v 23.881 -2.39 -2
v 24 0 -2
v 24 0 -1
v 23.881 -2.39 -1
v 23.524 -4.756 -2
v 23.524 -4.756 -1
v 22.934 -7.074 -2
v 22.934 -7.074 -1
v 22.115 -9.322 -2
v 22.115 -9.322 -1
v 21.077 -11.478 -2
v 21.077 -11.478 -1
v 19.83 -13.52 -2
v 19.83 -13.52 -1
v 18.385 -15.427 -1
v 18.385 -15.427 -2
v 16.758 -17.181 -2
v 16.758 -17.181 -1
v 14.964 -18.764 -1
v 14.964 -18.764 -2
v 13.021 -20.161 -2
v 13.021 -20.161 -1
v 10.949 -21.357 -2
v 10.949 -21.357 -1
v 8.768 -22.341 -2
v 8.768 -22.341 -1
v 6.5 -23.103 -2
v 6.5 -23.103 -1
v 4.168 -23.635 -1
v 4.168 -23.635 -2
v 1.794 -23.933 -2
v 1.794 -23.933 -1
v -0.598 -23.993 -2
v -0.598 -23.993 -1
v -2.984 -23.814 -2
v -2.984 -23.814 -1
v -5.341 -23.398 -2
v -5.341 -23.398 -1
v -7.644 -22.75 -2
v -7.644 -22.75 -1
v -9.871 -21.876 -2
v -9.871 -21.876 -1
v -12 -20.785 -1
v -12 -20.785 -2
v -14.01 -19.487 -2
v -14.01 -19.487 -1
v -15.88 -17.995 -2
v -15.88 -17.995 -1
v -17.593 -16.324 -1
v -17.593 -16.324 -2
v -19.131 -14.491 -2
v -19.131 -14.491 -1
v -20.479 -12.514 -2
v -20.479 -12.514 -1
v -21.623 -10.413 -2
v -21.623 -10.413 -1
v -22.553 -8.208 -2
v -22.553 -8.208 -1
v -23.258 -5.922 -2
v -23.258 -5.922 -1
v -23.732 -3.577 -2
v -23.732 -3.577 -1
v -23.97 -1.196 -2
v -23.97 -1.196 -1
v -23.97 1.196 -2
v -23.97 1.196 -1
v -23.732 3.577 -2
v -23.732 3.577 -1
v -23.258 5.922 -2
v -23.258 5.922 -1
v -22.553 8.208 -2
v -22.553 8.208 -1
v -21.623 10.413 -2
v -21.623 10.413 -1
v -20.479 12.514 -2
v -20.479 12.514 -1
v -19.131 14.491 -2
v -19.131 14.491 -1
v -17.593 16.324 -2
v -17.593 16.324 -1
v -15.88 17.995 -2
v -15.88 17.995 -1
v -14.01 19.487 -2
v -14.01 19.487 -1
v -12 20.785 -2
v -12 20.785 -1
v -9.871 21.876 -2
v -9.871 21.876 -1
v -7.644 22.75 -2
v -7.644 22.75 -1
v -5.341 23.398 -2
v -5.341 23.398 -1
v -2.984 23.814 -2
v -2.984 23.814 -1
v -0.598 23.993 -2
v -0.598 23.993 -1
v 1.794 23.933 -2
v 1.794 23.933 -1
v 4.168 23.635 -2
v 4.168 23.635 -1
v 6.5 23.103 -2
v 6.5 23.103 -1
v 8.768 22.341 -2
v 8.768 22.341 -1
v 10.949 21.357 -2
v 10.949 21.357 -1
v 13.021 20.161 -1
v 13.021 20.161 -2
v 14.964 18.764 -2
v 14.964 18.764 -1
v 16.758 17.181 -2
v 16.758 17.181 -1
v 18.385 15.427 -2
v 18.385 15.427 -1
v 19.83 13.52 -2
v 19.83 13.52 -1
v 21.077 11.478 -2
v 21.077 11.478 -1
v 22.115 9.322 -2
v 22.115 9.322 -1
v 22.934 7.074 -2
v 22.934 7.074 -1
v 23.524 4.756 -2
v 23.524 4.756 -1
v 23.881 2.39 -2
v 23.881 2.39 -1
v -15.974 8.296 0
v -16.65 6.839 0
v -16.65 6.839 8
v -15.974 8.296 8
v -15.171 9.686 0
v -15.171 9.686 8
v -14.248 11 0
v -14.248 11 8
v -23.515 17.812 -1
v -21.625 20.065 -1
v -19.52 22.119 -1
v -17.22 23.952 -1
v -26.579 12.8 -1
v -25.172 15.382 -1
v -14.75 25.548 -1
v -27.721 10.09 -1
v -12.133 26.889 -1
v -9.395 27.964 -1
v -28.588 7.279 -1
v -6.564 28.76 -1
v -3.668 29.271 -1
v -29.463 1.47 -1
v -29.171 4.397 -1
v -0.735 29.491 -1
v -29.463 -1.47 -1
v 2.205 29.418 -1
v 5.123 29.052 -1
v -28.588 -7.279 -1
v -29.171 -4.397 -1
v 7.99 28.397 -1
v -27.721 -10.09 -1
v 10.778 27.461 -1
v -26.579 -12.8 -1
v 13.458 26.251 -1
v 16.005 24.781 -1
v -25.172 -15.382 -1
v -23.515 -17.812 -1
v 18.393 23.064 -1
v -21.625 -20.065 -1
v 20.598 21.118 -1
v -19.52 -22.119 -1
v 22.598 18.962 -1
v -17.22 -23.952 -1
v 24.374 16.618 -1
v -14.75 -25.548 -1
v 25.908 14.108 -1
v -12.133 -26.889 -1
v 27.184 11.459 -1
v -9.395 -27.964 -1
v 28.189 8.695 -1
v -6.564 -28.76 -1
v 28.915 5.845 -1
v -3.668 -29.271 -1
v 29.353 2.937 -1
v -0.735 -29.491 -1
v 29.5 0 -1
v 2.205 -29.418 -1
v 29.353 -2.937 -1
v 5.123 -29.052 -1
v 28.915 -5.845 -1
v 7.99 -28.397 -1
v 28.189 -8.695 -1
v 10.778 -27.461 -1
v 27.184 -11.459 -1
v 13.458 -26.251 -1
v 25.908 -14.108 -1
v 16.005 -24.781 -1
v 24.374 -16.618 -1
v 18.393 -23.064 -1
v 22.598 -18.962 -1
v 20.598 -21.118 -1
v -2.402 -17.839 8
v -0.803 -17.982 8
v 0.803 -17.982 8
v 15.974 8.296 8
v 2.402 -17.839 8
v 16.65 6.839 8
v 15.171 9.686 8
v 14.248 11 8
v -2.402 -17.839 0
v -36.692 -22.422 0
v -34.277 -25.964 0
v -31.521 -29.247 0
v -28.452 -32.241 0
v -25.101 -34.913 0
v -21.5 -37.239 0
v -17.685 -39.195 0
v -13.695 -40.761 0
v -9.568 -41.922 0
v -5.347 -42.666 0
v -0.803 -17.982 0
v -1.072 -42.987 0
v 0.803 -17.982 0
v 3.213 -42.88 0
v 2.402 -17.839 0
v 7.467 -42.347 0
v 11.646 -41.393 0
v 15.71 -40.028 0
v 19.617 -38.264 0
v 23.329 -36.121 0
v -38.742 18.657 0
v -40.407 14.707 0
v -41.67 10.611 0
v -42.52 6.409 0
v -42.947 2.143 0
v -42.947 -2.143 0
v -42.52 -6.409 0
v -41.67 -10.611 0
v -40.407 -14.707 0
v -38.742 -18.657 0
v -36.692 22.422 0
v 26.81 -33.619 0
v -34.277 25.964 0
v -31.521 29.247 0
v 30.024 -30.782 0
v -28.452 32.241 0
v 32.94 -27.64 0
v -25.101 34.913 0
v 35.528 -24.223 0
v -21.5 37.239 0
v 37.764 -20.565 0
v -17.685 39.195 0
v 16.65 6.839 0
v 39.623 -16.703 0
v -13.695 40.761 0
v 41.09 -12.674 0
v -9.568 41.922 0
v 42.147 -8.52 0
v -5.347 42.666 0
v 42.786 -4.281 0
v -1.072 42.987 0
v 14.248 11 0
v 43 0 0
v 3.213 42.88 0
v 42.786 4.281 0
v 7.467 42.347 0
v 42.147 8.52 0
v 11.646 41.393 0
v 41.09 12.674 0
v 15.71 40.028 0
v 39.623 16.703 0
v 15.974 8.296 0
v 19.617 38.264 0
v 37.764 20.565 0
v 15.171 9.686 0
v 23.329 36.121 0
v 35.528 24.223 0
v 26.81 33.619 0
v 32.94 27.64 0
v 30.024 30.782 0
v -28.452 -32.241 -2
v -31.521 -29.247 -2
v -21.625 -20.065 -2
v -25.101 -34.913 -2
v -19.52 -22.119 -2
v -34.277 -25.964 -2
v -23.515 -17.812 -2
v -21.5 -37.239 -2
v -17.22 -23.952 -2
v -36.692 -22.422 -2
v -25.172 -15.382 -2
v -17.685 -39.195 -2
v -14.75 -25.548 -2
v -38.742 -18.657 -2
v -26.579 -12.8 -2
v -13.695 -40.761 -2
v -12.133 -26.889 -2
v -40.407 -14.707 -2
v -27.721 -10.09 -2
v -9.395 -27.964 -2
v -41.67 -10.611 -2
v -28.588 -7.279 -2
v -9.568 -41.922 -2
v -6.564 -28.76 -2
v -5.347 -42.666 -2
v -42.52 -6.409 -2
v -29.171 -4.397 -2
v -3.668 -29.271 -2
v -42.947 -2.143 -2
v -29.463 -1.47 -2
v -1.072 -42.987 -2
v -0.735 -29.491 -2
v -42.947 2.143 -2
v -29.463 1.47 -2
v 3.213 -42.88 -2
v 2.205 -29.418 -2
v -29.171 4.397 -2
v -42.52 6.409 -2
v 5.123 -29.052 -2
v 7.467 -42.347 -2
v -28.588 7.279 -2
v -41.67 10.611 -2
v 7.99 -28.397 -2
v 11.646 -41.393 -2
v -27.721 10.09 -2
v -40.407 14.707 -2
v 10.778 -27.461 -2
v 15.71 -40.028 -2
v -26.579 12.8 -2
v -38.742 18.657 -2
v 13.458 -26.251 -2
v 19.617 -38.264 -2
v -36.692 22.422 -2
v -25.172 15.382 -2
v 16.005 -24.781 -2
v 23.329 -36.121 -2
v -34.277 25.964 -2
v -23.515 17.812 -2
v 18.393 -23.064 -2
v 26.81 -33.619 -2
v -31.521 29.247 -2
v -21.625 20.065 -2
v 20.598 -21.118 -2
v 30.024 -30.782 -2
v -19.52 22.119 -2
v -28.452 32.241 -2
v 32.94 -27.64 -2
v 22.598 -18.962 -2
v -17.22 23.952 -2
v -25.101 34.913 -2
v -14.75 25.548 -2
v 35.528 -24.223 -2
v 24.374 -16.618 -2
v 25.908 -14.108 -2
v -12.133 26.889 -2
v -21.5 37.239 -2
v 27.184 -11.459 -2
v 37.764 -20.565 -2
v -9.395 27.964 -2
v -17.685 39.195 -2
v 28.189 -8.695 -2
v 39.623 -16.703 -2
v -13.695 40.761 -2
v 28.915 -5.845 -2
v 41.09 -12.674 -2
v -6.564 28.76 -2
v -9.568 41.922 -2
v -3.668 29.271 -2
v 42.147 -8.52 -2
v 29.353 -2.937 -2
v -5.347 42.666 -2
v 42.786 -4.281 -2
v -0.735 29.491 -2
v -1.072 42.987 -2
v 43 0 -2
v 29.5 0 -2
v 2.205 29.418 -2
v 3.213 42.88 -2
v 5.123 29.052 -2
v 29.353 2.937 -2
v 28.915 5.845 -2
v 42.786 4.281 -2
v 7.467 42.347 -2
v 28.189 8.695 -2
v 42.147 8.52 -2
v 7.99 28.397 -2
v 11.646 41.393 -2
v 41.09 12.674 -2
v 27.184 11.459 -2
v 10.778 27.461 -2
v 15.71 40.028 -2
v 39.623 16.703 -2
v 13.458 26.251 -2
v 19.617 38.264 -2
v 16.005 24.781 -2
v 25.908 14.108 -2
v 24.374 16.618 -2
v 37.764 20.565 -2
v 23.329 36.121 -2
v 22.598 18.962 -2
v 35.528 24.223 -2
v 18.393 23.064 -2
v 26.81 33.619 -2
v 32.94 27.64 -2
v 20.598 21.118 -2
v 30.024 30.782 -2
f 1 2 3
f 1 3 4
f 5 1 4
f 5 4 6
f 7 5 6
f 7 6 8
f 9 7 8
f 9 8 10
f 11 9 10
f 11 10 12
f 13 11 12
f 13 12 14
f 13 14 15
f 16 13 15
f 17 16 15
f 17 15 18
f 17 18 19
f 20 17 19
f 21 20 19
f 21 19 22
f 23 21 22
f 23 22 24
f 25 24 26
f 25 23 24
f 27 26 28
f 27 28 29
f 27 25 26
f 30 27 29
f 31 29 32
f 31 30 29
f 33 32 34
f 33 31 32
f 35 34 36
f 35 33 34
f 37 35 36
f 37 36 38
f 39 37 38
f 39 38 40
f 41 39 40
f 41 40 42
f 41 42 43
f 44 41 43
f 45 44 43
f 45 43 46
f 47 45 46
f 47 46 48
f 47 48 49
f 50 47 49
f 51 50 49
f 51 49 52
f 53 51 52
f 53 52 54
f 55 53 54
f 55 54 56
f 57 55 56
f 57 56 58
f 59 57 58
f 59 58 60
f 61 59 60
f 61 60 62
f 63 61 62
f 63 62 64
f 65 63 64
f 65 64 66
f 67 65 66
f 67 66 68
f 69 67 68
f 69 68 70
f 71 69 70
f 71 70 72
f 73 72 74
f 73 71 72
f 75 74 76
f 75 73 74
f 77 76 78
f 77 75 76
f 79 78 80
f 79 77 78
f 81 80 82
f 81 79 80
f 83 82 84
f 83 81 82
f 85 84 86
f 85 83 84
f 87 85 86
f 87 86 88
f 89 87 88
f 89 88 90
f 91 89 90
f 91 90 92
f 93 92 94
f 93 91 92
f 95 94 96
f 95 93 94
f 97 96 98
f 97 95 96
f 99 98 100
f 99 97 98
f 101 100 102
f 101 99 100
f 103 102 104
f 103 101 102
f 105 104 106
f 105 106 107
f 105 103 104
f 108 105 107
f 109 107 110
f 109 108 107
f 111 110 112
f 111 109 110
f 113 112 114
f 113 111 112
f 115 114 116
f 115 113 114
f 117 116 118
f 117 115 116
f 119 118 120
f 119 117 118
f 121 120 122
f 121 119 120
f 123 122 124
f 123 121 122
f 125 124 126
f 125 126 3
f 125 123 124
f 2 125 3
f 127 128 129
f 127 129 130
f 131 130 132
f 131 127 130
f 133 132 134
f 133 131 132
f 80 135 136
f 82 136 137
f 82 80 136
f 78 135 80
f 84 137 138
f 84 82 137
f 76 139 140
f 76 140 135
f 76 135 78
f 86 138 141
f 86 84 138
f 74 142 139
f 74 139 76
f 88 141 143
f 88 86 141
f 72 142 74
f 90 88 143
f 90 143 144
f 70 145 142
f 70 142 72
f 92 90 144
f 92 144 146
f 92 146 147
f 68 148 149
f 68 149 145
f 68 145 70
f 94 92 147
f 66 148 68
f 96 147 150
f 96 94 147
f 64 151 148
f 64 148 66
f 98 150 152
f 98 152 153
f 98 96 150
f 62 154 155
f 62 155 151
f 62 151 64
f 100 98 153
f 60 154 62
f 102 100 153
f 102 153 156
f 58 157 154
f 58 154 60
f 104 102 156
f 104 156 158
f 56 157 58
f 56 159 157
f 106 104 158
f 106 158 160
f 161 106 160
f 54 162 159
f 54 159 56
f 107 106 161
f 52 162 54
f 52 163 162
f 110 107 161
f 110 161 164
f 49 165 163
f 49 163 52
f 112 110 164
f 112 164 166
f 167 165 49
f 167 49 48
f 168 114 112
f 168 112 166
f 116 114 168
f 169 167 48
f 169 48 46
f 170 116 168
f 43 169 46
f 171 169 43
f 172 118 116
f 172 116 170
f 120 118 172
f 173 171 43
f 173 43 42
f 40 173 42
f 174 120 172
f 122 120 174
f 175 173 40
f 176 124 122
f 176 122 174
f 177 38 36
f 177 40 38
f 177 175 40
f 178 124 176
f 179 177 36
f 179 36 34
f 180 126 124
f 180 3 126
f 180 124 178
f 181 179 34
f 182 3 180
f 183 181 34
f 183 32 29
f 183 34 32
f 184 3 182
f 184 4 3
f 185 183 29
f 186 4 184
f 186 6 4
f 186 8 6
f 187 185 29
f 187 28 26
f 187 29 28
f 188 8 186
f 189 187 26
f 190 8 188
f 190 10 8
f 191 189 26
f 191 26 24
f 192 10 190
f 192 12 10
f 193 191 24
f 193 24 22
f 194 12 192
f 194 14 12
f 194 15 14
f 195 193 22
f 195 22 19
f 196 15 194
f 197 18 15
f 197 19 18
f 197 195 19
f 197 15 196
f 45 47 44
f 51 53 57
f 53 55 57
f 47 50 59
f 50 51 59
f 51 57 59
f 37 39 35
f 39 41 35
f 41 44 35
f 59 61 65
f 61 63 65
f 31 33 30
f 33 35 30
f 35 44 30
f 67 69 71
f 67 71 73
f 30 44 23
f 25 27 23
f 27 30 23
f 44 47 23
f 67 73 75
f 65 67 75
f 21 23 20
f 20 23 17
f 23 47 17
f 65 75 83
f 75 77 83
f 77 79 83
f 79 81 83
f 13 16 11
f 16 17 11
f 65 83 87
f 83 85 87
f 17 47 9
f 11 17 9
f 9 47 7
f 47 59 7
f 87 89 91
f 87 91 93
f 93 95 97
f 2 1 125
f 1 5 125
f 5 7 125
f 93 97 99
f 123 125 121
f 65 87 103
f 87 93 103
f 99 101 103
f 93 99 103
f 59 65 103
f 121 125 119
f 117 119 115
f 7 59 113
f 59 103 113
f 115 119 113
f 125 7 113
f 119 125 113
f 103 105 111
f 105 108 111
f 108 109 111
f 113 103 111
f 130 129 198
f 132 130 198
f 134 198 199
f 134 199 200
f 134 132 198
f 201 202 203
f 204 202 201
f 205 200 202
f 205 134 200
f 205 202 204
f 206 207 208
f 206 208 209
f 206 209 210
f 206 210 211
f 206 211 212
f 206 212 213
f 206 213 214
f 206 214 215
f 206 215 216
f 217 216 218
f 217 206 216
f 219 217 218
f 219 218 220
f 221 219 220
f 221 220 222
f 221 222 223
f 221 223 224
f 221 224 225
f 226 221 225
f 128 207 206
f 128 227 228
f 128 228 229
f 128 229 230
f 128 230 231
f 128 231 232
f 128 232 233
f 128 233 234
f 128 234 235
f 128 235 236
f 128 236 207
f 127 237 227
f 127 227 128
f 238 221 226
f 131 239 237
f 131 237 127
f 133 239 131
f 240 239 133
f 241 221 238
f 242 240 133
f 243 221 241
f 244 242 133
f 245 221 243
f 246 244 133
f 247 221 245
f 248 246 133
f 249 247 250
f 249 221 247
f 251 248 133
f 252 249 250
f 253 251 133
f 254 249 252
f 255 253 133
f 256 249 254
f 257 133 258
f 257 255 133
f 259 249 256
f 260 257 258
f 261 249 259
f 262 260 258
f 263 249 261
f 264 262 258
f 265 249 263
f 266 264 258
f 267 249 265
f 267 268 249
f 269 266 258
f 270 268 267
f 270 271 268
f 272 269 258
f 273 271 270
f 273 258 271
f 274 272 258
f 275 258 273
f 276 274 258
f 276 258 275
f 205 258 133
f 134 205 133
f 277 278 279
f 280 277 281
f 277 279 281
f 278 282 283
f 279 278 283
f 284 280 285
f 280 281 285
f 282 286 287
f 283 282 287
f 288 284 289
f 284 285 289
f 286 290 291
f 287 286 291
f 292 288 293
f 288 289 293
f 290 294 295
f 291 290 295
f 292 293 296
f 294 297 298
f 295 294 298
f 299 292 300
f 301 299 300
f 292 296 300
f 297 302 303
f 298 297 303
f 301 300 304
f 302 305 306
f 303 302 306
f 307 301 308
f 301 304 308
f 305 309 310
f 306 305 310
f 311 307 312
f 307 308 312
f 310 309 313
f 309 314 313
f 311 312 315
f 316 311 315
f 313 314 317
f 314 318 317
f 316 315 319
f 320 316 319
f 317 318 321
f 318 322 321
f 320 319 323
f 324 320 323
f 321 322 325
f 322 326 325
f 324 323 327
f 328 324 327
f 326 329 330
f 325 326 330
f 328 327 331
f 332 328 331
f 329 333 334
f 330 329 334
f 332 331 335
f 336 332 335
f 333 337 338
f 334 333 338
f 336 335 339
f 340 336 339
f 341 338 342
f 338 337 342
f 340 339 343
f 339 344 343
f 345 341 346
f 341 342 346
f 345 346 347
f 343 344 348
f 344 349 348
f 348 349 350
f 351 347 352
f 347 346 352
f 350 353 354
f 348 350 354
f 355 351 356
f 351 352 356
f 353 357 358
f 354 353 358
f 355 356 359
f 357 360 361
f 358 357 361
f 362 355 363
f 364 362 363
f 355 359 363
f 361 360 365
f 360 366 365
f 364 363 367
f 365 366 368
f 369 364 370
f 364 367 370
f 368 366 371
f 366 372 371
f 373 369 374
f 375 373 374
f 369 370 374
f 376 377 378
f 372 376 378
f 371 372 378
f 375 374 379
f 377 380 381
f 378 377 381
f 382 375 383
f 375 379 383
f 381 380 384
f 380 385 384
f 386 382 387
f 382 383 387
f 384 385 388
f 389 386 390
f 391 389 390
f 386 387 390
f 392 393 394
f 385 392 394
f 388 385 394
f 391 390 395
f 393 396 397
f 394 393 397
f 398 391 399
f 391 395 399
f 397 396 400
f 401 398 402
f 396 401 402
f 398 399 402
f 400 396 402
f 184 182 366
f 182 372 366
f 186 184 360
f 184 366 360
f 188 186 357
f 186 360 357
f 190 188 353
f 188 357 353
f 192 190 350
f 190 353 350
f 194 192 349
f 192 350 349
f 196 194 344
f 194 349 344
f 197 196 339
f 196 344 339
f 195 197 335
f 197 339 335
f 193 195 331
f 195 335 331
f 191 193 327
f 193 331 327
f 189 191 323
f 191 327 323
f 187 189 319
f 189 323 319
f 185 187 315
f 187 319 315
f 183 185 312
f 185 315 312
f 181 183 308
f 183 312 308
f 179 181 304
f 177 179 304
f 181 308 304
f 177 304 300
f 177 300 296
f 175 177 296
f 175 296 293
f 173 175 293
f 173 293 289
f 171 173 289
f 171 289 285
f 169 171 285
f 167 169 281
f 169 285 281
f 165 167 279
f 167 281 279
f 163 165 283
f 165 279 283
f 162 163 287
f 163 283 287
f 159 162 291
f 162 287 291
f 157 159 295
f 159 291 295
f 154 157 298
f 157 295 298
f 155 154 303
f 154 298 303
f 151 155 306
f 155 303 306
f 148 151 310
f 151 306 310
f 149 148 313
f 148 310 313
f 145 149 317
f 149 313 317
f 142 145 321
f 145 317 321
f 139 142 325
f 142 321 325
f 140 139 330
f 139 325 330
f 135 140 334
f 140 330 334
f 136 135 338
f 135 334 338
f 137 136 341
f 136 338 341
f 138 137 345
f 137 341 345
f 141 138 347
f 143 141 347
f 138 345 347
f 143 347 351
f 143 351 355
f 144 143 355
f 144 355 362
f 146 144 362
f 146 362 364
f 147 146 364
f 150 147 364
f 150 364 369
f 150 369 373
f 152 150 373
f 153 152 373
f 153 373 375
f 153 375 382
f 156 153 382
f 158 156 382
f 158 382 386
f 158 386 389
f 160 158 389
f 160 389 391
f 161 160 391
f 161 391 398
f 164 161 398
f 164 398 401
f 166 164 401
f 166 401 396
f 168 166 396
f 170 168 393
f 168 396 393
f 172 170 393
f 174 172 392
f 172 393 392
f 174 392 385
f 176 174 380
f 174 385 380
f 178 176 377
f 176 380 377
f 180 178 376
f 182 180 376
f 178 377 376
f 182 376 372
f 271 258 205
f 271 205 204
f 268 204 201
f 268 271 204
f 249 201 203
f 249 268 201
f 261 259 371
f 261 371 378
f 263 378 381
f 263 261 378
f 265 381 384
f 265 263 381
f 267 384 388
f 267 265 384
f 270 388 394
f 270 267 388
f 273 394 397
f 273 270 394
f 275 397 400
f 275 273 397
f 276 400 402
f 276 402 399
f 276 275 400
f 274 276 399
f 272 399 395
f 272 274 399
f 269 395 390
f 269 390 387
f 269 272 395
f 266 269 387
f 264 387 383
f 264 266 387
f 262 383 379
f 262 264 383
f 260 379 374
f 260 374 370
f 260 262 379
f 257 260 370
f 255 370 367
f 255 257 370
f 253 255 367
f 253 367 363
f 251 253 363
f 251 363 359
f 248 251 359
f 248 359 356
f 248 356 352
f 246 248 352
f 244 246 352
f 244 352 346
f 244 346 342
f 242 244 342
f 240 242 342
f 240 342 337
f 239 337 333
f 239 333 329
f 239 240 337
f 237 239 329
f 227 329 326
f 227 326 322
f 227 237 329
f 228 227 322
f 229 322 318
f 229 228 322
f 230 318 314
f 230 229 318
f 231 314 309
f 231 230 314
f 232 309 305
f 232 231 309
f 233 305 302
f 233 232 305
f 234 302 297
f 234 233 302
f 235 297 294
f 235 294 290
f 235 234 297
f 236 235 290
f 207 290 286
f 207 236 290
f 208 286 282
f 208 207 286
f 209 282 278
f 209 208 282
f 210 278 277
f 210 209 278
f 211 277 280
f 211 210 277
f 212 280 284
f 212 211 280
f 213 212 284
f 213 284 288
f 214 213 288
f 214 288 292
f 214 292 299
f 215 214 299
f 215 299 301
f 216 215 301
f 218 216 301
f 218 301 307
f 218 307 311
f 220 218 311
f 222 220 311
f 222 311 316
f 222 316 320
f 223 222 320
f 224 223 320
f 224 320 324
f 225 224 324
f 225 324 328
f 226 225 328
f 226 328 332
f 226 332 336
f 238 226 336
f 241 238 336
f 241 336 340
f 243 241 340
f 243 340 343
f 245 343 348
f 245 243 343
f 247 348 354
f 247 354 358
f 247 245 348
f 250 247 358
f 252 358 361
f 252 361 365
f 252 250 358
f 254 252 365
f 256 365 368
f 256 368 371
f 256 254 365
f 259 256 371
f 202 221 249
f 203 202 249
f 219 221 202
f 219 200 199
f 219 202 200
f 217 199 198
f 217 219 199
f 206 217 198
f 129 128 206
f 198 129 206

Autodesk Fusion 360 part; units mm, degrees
sketch "草图1" plane through (0, 0, 0) normal (0, 0, 1) x (1, 0, 0)
  arc A0 (-2.4024, -17.839) -> (2.4024, -17.839) centre (0, 0) ccw
  line L0 (0, 0) -> (0, -48) construction
  line L1 (14.2478, 11) -> (-14.2478, 11)
  line L2 (2.4024, -17.839) -> (16.6502, 6.839)
  arc A1 (-14.2478, 11) -> (-16.6502, 6.839) centre (0, 0) ccw
  line L3 (-16.6502, 6.839) -> (-2.4024, -17.839)
  arc A2 (16.6502, 6.839) -> (14.2478, 11) centre (0, 0) ccw
  circle A3 centre (0, 0) radius 43
extrude "拉伸1" add sketch "草图1" against normal blind 2 contours A0 L1 L2 A1 L3 A2 | A3 makes body 1
extrude "拉伸2" add sketch "草图1" along normal blind 8 contours A0 L1 L2 A1 L3 A2 bodies 1
copy_body "实体->零部件1" bodies 1 removing the originals makes body 2 in component "亚克力2"
sketch "草图2" plane through (0, 0, -2) normal (0, 0, -1) x (1, 0, 0)
  circle A0 centre (0, 0) radius 43
  circle A1 centre (0, 0) radius 29.5
  circle A2 centre (0, 0) radius 24
  dimension "d11" = 59
  dimension "d12" = 48
extrude "拉伸1'" cut sketch "草图2" against normal blind 1 contours A1 bodies 2 in component "亚克力2"
component "亚克力2" placed x (1, 0, 0) y (0, 1, 0) z (0, 0, 1) at (0, 0, 0)
